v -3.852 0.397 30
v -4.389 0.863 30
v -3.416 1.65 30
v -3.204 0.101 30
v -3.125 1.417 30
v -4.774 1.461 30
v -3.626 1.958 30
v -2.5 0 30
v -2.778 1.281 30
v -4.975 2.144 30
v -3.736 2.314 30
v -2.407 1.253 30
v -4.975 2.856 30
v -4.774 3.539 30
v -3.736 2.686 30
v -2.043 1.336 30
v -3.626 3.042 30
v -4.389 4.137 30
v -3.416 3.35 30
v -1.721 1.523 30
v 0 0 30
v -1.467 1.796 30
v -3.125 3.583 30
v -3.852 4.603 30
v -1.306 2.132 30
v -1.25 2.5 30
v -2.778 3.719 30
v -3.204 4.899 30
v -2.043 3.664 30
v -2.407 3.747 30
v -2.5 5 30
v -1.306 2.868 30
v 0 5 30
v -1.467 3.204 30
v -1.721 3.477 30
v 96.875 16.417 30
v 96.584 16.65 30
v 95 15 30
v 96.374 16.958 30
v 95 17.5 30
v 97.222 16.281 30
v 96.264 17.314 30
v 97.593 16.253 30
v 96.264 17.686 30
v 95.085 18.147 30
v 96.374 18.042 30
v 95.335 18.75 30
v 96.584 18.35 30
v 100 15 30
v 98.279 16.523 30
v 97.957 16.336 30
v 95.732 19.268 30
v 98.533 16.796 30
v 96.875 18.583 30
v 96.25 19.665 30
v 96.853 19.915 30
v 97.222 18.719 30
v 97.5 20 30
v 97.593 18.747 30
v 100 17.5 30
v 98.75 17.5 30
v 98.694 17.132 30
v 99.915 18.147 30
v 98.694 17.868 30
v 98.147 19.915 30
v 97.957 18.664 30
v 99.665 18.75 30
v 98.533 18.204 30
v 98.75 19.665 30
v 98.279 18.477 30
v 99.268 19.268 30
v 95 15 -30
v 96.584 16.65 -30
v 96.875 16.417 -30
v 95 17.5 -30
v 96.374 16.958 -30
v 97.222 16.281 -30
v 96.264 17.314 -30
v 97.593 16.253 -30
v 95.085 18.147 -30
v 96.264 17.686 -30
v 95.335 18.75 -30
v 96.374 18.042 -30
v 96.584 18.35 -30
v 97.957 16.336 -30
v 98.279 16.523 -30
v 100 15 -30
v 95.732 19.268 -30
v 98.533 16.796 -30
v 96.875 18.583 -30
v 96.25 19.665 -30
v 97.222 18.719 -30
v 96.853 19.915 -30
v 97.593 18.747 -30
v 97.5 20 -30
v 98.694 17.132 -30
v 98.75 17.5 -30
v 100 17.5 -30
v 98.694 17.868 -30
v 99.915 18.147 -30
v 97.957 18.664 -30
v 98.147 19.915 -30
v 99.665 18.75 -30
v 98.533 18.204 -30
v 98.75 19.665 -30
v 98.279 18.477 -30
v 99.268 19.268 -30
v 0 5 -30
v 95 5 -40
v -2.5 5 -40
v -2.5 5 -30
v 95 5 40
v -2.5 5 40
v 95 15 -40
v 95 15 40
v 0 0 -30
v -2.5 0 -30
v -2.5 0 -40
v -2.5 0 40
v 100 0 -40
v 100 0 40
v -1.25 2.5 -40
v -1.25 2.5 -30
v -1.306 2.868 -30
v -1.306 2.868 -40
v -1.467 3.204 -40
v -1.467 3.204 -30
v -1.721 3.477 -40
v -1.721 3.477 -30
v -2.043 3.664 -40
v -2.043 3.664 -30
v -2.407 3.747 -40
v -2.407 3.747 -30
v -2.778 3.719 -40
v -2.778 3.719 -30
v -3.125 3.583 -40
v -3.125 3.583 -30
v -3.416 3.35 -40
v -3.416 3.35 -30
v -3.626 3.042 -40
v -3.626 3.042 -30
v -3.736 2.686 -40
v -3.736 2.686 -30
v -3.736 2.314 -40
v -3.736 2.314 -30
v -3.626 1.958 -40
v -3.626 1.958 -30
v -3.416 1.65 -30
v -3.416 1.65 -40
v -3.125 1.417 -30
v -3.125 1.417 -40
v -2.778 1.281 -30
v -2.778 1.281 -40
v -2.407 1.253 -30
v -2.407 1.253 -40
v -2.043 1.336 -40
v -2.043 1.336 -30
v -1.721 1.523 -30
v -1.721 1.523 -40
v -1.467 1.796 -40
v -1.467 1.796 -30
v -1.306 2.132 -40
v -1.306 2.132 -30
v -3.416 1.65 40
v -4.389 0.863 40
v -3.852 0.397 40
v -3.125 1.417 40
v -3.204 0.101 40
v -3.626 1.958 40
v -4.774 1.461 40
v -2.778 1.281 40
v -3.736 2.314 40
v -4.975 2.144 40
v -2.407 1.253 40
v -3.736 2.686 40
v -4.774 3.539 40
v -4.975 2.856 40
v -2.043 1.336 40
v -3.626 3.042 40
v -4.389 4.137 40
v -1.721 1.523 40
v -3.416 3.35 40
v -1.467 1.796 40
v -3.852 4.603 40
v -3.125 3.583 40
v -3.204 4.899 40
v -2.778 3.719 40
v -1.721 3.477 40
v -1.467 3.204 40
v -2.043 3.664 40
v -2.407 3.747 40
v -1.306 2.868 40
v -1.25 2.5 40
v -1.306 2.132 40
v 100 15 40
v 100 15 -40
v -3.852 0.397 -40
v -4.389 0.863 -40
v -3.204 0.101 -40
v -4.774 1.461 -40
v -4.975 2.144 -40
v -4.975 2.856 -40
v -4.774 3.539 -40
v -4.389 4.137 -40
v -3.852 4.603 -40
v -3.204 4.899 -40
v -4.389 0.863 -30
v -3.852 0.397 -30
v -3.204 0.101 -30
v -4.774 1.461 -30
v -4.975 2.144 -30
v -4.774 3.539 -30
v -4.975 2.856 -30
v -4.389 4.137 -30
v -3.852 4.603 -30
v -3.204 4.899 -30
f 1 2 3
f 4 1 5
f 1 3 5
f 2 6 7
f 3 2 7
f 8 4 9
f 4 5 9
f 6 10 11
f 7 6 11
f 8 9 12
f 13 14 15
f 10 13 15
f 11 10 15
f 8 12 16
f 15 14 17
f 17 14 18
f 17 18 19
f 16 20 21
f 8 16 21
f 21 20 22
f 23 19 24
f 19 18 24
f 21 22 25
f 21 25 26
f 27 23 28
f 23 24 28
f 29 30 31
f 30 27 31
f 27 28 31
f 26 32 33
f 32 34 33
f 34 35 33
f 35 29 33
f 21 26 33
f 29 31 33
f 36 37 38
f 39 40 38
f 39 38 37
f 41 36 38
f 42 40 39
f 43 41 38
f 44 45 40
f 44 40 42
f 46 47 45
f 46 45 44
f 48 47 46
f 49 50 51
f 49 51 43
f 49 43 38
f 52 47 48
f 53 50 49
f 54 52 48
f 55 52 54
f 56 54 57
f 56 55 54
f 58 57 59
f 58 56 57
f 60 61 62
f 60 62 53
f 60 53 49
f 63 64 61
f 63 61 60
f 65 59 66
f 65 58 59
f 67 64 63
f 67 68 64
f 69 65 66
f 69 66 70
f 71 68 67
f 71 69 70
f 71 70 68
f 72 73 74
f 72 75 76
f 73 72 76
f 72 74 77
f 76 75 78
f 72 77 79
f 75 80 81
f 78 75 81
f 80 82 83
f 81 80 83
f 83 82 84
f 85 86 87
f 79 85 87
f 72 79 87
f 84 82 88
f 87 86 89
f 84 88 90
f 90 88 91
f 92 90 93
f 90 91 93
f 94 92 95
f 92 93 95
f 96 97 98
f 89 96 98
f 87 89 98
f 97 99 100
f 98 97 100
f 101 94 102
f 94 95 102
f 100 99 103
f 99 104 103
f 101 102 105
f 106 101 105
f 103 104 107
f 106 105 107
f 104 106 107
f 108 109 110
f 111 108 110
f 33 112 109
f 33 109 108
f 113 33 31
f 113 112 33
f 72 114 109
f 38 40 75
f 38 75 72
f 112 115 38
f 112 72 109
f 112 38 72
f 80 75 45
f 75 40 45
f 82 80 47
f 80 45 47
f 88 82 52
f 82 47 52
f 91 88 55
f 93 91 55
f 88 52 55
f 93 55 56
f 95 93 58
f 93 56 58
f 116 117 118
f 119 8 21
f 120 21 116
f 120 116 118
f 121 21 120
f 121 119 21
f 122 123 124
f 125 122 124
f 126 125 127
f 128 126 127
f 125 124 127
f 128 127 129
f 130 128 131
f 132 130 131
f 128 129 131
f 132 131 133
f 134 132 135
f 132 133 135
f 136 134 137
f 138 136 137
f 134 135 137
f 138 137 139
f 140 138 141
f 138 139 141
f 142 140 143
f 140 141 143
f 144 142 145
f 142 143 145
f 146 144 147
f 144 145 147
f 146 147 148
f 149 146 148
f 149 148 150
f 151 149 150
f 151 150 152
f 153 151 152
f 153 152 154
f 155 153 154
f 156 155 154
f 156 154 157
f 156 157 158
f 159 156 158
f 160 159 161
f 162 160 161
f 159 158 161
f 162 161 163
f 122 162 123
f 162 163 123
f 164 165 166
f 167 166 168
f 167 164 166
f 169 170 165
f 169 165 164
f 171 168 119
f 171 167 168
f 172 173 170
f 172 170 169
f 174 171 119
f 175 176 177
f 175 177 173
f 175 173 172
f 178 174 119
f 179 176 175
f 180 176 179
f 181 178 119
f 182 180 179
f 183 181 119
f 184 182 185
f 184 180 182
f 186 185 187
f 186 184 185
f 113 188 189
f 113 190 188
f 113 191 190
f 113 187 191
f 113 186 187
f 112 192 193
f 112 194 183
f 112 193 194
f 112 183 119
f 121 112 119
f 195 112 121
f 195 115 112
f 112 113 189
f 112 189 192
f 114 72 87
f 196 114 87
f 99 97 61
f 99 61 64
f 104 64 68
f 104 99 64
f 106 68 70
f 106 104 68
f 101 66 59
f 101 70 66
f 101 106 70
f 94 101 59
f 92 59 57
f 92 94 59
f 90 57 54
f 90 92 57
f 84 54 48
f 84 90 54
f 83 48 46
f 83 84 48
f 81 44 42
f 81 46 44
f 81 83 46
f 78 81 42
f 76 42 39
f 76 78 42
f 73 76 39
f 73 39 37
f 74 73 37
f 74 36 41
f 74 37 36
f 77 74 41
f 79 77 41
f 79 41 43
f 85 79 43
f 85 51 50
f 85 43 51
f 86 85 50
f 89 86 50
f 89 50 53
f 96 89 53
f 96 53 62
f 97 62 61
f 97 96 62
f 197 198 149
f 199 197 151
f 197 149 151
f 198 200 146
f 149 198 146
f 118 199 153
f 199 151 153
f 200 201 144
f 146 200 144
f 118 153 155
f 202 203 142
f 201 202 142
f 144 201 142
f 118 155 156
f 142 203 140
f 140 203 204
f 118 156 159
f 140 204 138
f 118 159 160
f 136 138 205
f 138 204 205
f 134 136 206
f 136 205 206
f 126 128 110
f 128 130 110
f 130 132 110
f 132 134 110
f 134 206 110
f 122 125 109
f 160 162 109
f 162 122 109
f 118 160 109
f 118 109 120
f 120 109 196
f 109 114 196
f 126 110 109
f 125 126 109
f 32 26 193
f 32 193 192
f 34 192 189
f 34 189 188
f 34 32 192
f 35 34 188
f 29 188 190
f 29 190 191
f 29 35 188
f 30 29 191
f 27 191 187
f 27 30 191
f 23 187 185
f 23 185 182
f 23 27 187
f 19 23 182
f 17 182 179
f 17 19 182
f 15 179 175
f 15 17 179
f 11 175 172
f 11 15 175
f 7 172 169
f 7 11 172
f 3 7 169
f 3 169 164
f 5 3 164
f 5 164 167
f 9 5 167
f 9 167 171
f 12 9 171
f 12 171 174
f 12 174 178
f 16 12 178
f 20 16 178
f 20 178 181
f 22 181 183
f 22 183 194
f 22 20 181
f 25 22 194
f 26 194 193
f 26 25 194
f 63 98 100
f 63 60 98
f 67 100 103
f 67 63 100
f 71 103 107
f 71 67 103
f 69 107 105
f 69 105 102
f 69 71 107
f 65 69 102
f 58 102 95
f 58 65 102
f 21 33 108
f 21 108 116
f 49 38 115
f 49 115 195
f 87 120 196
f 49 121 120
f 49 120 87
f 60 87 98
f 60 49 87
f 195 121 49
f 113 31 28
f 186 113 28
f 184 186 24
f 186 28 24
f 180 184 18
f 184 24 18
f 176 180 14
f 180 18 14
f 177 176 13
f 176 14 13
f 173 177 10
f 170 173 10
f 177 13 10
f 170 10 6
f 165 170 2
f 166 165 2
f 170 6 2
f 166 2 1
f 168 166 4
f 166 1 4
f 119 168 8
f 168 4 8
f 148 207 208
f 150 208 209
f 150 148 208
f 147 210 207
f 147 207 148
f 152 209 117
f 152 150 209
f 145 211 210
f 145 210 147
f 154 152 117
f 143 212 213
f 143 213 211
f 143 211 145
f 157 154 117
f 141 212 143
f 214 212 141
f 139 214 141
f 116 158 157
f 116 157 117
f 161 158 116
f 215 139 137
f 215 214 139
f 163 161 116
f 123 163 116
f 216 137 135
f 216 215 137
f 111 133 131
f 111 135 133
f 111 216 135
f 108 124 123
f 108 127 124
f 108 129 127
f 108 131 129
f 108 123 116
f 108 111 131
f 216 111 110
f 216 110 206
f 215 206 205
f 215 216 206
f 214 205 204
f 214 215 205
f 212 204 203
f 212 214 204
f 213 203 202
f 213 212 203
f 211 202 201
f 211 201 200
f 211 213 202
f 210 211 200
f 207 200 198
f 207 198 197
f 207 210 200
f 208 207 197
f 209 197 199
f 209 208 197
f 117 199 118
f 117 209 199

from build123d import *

# Parameters (mm, degrees)
BOSS_EXTRUDE1_DEPTH     = 40
BOSS_EXTRUDE2_START     = 30
SKETCH2_R               = 1.25
BOSS_EXTRUDE2_DEPTH     = 10
CUT_EXTRUDE1_START      = -30
SKETCH3_W               = 5
SKETCH3_H               = 5
CUT_EXTRUDE1_DEPTH      = 10
CUT_EXTRUDE2_DEPTH      = 110.544511501
CUT_EXTRUDE2_DEPTH_BACK = 110.544511501
SKETCH4_R               = 1.25
FILLET1_R               = 2.5


with BuildPart() as part:
    # Sketch1 → Boss-Extrude1 (new, symmetric)
    with BuildSketch(Plane.XY):
        Polygon((0, 0), (100, 0), (100, 20), (95, 20), (95, 5), (0, 5), align=None)
    extrude(amount=BOSS_EXTRUDE1_DEPTH, both=True)

    # Sketch2 → Boss-Extrude2 (add)
    with BuildSketch(Plane.XY.offset(BOSS_EXTRUDE2_START)):
        with BuildLine():
            Line((0, 5), (-2.5, 5))
            ThreePointArc((-2.5, 5), (-5, 2.5), (-2.5, 0))
            Line((-2.5, 0), (0, 0))
            Line((0, 0), (0, 5))
        make_face()
        with Locations((-2.5, 2.5)):
            Circle(SKETCH2_R, mode=Mode.SUBTRACT)
    boss_extrude2 = extrude(amount=BOSS_EXTRUDE2_DEPTH)

    # Mirror2: Boss-Extrude2 across plane
    add(boss_extrude2.mirror(Plane.XY))

    # Sketch3 → Cut-Extrude1 (cut)
    with BuildSketch(Plane.XY.offset(CUT_EXTRUDE1_START)):
        with Locations((97.5, 17.5)):
            Rectangle(SKETCH3_W, SKETCH3_H)
    cut_extrude1 = extrude(amount=-CUT_EXTRUDE1_DEPTH, mode=Mode.SUBTRACT)

    # Mirror3: Cut-Extrude1 across plane
    add(cut_extrude1.mirror(Plane.XY), mode=Mode.SUBTRACT)

    # Sketch4 → Cut-Extrude2 (cut, two sides: drawn at the far end of the back side and taken through both)
    with BuildSketch(Plane.XY.offset(-CUT_EXTRUDE2_DEPTH_BACK)):
        with Locations((97.5, 17.5)):
            Circle(SKETCH4_R)
    extrude(amount=CUT_EXTRUDE2_DEPTH + CUT_EXTRUDE2_DEPTH_BACK, mode=Mode.SUBTRACT)

    # Fillet1
    fillet1_edges = [part.edges().sort_by_distance(p)[0] for p in [
        (95, 20, 0),
        (100, 20, 0),
    ]]
    fillet(fillet1_edges, radius=FILLET1_R - 0.0001)  # a hair under: the kernel refuses the full size


solid = part.part
